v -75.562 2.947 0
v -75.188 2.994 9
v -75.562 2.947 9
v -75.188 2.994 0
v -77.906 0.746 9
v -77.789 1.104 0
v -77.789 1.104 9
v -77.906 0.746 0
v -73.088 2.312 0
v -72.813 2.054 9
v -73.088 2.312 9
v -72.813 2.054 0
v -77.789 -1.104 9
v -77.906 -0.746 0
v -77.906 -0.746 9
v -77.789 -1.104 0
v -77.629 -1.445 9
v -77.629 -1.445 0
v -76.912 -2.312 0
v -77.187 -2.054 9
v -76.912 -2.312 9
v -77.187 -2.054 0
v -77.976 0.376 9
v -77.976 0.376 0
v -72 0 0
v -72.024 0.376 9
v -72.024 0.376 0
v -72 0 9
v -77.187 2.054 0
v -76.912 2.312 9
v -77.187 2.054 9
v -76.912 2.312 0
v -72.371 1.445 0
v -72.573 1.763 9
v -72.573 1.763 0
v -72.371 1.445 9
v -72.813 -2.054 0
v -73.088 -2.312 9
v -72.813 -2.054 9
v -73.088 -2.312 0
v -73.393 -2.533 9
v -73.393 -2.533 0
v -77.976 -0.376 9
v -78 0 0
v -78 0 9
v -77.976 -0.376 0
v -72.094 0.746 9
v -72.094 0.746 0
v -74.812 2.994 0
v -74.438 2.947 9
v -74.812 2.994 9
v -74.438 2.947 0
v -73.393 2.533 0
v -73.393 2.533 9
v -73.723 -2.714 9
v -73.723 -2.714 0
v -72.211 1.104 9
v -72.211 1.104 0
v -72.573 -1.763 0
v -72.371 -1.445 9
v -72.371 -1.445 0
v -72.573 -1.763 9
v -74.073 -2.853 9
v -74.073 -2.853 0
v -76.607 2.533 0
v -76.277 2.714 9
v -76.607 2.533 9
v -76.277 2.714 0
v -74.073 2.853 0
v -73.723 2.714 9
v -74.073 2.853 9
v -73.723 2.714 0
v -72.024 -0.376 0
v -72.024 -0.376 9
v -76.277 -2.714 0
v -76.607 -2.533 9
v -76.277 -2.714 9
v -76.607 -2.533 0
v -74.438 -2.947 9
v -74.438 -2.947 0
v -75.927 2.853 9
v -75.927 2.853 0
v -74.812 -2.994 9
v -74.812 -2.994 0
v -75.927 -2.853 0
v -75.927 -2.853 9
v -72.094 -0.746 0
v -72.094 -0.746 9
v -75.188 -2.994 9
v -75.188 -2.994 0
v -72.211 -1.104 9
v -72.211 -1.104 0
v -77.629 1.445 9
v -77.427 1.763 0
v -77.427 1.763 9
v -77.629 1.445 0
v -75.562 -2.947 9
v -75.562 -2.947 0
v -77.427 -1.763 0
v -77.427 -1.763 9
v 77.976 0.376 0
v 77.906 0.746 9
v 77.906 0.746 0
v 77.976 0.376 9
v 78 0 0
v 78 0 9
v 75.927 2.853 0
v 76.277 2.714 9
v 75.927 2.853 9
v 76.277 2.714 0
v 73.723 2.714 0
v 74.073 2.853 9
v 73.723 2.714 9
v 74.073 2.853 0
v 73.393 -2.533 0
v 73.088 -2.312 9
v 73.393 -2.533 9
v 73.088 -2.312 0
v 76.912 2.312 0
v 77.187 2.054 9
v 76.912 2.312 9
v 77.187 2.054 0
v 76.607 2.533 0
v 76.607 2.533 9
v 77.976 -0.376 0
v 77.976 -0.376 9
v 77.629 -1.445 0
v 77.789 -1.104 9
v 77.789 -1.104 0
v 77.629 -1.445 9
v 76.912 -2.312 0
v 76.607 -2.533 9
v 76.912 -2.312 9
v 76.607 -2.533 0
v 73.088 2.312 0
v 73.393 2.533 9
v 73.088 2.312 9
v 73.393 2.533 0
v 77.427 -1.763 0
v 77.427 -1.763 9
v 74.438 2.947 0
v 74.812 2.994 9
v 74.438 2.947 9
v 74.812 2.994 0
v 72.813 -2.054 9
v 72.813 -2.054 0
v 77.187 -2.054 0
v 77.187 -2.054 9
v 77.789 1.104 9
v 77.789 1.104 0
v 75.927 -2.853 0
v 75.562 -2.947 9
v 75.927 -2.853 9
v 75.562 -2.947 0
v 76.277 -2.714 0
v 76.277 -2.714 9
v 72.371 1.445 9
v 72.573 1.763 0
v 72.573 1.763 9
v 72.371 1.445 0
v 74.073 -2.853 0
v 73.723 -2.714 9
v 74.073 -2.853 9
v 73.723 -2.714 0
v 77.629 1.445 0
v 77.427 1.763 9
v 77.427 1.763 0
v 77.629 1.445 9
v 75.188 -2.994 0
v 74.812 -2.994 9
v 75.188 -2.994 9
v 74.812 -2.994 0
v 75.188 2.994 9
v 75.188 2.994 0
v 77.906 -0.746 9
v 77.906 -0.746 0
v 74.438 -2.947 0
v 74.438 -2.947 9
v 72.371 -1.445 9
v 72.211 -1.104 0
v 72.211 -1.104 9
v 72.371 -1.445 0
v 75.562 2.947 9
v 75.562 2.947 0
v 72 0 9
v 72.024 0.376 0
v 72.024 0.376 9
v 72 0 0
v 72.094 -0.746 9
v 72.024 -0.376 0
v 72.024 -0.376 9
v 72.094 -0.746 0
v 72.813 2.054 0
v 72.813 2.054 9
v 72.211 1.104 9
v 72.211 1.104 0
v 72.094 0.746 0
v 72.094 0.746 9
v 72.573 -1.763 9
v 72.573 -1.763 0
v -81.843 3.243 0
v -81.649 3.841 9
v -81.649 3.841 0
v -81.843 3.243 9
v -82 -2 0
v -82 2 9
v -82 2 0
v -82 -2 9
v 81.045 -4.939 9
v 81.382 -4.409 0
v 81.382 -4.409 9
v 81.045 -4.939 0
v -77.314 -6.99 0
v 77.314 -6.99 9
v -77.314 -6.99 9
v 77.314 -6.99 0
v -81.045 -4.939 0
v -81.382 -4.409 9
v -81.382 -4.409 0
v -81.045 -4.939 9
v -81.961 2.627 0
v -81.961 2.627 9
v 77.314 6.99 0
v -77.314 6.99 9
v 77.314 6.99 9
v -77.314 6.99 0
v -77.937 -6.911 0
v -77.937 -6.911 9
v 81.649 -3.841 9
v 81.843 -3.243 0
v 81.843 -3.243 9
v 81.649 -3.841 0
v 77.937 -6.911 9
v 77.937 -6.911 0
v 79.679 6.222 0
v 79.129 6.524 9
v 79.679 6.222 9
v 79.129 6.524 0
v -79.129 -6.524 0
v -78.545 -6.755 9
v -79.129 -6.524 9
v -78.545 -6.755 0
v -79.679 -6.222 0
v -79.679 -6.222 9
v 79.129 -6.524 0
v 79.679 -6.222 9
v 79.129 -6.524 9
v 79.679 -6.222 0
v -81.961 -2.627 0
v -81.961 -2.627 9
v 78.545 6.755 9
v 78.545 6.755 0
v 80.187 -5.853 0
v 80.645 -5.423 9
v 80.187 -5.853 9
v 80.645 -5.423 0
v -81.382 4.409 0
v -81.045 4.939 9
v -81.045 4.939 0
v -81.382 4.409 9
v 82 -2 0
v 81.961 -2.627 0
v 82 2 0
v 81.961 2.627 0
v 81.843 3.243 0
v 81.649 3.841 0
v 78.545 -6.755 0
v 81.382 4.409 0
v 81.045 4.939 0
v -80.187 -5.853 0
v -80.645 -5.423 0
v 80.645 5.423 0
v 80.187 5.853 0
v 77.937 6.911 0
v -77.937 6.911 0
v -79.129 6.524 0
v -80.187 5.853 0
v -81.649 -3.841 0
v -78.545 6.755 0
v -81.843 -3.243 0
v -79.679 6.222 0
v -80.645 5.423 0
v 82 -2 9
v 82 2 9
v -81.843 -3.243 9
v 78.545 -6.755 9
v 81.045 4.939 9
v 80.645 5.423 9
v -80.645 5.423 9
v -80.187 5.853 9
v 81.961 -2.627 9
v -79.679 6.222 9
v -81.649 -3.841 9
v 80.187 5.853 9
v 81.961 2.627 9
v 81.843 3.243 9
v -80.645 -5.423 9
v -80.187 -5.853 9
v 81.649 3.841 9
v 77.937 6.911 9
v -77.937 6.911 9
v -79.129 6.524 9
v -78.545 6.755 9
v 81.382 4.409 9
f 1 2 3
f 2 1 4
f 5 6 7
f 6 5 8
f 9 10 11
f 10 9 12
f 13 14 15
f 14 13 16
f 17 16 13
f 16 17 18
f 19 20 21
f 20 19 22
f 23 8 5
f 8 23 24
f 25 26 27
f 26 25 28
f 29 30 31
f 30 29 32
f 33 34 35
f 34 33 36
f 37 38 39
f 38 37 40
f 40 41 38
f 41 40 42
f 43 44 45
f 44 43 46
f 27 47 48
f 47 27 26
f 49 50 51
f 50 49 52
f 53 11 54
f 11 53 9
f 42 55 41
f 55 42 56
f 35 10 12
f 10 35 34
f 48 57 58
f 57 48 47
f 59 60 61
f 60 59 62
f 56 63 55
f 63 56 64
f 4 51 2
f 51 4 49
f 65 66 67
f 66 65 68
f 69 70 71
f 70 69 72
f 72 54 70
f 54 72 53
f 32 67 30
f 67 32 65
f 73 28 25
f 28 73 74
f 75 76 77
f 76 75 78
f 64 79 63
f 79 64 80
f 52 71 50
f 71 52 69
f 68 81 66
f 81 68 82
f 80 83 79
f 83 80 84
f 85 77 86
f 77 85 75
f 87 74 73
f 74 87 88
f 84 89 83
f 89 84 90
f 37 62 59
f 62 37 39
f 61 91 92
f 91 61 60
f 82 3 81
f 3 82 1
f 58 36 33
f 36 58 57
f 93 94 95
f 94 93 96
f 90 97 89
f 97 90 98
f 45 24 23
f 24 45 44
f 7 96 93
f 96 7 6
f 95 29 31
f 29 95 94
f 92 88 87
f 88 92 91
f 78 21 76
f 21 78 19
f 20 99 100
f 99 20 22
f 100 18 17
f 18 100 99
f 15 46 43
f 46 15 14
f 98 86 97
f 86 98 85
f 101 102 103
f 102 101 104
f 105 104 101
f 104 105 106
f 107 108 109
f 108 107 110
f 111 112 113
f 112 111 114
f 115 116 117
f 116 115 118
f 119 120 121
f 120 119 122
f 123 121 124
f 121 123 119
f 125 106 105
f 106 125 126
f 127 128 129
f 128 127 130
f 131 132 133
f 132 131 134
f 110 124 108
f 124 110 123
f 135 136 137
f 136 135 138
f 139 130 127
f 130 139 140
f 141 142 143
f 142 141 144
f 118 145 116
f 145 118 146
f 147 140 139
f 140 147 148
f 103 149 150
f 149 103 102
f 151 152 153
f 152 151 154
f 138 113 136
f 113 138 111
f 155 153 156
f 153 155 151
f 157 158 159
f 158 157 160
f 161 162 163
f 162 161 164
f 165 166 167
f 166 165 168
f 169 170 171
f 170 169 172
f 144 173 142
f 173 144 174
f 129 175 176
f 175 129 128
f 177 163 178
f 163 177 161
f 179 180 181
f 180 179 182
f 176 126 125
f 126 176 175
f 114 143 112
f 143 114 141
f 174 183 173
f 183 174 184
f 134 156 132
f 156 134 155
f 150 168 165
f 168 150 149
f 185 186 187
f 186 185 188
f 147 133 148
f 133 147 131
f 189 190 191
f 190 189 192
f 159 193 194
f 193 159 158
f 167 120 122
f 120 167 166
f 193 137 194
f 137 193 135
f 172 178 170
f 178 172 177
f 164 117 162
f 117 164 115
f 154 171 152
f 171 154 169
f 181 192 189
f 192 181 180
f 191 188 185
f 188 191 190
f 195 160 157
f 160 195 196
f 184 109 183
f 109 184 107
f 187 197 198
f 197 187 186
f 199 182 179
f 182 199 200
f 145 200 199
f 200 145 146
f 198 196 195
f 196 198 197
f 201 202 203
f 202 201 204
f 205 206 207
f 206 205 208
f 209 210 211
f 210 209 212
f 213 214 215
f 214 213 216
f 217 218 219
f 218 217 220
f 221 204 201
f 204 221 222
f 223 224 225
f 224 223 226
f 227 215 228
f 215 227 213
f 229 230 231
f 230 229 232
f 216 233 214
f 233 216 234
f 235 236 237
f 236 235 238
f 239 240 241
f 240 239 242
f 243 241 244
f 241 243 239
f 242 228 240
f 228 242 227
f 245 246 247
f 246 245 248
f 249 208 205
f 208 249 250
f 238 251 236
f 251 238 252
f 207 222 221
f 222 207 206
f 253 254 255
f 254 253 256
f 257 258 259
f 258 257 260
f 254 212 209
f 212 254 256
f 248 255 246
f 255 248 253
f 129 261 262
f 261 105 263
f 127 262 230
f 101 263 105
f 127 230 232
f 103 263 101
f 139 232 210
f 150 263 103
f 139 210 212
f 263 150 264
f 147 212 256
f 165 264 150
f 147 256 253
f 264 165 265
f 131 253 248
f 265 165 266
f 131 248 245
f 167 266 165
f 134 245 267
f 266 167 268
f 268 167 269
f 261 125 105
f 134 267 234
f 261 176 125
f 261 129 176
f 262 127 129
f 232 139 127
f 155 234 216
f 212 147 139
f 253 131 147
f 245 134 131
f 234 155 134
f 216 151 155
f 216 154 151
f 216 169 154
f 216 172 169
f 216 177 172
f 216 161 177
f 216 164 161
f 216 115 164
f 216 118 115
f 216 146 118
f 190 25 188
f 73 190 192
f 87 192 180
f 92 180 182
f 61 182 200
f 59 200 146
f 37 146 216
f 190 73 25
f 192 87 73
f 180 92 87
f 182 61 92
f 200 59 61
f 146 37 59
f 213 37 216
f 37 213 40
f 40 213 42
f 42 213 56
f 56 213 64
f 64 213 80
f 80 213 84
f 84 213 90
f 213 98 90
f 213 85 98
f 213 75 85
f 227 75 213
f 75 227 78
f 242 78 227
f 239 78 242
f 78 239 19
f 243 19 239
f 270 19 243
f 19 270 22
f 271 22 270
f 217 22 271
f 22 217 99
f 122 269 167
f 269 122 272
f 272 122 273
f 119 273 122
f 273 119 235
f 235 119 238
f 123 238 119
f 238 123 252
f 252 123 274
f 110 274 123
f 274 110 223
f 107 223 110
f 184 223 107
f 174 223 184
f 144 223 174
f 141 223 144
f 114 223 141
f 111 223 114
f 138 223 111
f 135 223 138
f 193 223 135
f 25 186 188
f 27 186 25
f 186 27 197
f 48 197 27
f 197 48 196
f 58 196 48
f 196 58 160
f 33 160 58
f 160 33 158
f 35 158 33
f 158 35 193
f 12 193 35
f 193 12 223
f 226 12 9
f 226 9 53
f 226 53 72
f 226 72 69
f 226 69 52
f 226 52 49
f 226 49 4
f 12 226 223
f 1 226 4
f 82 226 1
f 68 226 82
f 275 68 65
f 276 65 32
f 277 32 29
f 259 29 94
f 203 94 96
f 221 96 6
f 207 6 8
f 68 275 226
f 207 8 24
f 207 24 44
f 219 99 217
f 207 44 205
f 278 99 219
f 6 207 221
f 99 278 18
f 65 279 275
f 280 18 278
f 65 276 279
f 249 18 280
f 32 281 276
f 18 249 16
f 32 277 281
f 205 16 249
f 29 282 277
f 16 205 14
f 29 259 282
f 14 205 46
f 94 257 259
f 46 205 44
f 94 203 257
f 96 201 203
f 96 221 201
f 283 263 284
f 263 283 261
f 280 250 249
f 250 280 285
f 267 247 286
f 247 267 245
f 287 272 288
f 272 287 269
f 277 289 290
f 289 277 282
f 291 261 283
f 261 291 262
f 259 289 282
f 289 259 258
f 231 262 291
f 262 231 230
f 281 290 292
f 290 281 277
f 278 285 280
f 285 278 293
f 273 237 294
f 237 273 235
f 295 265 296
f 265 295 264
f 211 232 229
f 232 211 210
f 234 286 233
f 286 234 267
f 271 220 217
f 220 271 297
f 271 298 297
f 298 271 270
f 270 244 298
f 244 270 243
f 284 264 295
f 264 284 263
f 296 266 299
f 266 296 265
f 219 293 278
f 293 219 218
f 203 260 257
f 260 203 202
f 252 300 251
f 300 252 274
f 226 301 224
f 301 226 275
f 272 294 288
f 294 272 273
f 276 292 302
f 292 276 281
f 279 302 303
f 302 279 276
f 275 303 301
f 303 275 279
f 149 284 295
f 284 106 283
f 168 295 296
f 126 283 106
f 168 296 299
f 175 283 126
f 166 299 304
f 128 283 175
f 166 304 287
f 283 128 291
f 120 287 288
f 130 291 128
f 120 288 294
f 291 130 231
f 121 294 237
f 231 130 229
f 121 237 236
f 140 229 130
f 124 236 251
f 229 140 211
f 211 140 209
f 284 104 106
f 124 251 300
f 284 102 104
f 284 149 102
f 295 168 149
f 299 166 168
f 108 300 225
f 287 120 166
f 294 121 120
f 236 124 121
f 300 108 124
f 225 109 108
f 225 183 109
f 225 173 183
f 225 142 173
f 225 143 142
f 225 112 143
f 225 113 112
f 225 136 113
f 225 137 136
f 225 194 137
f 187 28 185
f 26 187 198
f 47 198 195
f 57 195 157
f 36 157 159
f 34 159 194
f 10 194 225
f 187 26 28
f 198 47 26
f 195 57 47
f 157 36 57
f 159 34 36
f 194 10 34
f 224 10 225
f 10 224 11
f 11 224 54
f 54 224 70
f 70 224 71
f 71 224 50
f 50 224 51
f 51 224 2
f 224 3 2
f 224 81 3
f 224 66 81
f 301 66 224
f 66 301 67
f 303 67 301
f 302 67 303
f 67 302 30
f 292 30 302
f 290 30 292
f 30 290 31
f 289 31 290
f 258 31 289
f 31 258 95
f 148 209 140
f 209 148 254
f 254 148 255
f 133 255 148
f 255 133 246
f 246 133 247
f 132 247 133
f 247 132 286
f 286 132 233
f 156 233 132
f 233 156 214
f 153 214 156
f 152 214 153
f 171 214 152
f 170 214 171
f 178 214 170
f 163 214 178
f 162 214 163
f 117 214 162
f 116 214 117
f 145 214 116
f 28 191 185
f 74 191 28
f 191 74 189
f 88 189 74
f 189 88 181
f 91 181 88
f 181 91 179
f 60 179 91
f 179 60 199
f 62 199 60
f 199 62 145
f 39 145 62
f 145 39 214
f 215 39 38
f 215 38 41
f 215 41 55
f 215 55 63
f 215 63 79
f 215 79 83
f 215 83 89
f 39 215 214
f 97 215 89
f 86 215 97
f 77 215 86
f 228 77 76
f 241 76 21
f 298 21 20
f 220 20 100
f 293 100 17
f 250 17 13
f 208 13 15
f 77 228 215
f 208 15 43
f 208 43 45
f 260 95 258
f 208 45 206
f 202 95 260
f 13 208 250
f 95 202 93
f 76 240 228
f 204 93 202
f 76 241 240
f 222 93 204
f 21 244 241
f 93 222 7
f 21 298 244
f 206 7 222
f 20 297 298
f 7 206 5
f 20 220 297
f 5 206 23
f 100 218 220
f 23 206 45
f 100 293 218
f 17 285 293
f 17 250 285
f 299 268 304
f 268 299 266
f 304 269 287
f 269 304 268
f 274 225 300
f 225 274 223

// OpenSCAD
$fn = 50;


difference() {
	union() {
		hull() {
			translate(v = [-77.0000000000, 2.0000000000, 0]) {
				cylinder(h = 9, r = 5);
			}
			translate(v = [77.0000000000, 2.0000000000, 0]) {
				cylinder(h = 9, r = 5);
			}
			translate(v = [-77.0000000000, -2.0000000000, 0]) {
				cylinder(h = 9, r = 5);
			}
			translate(v = [77.0000000000, -2.0000000000, 0]) {
				cylinder(h = 9, r = 5);
			}
		}
	}
	union() {
		translate(v = [-75.0000000000, 0.0000000000, -100.0000000000]) {
			cylinder(h = 200, r = 3.0000000000);
		}
		translate(v = [-75.0000000000, 0.0000000000, -100.0000000000]) {
			cylinder(h = 200, r = 3.0000000000);
		}
		translate(v = [75.0000000000, 0.0000000000, -100.0000000000]) {
			cylinder(h = 200, r = 3.0000000000);
		}
		translate(v = [75.0000000000, 0.0000000000, -100.0000000000]) {
			cylinder(h = 200, r = 3.0000000000);
		}
	}
}
